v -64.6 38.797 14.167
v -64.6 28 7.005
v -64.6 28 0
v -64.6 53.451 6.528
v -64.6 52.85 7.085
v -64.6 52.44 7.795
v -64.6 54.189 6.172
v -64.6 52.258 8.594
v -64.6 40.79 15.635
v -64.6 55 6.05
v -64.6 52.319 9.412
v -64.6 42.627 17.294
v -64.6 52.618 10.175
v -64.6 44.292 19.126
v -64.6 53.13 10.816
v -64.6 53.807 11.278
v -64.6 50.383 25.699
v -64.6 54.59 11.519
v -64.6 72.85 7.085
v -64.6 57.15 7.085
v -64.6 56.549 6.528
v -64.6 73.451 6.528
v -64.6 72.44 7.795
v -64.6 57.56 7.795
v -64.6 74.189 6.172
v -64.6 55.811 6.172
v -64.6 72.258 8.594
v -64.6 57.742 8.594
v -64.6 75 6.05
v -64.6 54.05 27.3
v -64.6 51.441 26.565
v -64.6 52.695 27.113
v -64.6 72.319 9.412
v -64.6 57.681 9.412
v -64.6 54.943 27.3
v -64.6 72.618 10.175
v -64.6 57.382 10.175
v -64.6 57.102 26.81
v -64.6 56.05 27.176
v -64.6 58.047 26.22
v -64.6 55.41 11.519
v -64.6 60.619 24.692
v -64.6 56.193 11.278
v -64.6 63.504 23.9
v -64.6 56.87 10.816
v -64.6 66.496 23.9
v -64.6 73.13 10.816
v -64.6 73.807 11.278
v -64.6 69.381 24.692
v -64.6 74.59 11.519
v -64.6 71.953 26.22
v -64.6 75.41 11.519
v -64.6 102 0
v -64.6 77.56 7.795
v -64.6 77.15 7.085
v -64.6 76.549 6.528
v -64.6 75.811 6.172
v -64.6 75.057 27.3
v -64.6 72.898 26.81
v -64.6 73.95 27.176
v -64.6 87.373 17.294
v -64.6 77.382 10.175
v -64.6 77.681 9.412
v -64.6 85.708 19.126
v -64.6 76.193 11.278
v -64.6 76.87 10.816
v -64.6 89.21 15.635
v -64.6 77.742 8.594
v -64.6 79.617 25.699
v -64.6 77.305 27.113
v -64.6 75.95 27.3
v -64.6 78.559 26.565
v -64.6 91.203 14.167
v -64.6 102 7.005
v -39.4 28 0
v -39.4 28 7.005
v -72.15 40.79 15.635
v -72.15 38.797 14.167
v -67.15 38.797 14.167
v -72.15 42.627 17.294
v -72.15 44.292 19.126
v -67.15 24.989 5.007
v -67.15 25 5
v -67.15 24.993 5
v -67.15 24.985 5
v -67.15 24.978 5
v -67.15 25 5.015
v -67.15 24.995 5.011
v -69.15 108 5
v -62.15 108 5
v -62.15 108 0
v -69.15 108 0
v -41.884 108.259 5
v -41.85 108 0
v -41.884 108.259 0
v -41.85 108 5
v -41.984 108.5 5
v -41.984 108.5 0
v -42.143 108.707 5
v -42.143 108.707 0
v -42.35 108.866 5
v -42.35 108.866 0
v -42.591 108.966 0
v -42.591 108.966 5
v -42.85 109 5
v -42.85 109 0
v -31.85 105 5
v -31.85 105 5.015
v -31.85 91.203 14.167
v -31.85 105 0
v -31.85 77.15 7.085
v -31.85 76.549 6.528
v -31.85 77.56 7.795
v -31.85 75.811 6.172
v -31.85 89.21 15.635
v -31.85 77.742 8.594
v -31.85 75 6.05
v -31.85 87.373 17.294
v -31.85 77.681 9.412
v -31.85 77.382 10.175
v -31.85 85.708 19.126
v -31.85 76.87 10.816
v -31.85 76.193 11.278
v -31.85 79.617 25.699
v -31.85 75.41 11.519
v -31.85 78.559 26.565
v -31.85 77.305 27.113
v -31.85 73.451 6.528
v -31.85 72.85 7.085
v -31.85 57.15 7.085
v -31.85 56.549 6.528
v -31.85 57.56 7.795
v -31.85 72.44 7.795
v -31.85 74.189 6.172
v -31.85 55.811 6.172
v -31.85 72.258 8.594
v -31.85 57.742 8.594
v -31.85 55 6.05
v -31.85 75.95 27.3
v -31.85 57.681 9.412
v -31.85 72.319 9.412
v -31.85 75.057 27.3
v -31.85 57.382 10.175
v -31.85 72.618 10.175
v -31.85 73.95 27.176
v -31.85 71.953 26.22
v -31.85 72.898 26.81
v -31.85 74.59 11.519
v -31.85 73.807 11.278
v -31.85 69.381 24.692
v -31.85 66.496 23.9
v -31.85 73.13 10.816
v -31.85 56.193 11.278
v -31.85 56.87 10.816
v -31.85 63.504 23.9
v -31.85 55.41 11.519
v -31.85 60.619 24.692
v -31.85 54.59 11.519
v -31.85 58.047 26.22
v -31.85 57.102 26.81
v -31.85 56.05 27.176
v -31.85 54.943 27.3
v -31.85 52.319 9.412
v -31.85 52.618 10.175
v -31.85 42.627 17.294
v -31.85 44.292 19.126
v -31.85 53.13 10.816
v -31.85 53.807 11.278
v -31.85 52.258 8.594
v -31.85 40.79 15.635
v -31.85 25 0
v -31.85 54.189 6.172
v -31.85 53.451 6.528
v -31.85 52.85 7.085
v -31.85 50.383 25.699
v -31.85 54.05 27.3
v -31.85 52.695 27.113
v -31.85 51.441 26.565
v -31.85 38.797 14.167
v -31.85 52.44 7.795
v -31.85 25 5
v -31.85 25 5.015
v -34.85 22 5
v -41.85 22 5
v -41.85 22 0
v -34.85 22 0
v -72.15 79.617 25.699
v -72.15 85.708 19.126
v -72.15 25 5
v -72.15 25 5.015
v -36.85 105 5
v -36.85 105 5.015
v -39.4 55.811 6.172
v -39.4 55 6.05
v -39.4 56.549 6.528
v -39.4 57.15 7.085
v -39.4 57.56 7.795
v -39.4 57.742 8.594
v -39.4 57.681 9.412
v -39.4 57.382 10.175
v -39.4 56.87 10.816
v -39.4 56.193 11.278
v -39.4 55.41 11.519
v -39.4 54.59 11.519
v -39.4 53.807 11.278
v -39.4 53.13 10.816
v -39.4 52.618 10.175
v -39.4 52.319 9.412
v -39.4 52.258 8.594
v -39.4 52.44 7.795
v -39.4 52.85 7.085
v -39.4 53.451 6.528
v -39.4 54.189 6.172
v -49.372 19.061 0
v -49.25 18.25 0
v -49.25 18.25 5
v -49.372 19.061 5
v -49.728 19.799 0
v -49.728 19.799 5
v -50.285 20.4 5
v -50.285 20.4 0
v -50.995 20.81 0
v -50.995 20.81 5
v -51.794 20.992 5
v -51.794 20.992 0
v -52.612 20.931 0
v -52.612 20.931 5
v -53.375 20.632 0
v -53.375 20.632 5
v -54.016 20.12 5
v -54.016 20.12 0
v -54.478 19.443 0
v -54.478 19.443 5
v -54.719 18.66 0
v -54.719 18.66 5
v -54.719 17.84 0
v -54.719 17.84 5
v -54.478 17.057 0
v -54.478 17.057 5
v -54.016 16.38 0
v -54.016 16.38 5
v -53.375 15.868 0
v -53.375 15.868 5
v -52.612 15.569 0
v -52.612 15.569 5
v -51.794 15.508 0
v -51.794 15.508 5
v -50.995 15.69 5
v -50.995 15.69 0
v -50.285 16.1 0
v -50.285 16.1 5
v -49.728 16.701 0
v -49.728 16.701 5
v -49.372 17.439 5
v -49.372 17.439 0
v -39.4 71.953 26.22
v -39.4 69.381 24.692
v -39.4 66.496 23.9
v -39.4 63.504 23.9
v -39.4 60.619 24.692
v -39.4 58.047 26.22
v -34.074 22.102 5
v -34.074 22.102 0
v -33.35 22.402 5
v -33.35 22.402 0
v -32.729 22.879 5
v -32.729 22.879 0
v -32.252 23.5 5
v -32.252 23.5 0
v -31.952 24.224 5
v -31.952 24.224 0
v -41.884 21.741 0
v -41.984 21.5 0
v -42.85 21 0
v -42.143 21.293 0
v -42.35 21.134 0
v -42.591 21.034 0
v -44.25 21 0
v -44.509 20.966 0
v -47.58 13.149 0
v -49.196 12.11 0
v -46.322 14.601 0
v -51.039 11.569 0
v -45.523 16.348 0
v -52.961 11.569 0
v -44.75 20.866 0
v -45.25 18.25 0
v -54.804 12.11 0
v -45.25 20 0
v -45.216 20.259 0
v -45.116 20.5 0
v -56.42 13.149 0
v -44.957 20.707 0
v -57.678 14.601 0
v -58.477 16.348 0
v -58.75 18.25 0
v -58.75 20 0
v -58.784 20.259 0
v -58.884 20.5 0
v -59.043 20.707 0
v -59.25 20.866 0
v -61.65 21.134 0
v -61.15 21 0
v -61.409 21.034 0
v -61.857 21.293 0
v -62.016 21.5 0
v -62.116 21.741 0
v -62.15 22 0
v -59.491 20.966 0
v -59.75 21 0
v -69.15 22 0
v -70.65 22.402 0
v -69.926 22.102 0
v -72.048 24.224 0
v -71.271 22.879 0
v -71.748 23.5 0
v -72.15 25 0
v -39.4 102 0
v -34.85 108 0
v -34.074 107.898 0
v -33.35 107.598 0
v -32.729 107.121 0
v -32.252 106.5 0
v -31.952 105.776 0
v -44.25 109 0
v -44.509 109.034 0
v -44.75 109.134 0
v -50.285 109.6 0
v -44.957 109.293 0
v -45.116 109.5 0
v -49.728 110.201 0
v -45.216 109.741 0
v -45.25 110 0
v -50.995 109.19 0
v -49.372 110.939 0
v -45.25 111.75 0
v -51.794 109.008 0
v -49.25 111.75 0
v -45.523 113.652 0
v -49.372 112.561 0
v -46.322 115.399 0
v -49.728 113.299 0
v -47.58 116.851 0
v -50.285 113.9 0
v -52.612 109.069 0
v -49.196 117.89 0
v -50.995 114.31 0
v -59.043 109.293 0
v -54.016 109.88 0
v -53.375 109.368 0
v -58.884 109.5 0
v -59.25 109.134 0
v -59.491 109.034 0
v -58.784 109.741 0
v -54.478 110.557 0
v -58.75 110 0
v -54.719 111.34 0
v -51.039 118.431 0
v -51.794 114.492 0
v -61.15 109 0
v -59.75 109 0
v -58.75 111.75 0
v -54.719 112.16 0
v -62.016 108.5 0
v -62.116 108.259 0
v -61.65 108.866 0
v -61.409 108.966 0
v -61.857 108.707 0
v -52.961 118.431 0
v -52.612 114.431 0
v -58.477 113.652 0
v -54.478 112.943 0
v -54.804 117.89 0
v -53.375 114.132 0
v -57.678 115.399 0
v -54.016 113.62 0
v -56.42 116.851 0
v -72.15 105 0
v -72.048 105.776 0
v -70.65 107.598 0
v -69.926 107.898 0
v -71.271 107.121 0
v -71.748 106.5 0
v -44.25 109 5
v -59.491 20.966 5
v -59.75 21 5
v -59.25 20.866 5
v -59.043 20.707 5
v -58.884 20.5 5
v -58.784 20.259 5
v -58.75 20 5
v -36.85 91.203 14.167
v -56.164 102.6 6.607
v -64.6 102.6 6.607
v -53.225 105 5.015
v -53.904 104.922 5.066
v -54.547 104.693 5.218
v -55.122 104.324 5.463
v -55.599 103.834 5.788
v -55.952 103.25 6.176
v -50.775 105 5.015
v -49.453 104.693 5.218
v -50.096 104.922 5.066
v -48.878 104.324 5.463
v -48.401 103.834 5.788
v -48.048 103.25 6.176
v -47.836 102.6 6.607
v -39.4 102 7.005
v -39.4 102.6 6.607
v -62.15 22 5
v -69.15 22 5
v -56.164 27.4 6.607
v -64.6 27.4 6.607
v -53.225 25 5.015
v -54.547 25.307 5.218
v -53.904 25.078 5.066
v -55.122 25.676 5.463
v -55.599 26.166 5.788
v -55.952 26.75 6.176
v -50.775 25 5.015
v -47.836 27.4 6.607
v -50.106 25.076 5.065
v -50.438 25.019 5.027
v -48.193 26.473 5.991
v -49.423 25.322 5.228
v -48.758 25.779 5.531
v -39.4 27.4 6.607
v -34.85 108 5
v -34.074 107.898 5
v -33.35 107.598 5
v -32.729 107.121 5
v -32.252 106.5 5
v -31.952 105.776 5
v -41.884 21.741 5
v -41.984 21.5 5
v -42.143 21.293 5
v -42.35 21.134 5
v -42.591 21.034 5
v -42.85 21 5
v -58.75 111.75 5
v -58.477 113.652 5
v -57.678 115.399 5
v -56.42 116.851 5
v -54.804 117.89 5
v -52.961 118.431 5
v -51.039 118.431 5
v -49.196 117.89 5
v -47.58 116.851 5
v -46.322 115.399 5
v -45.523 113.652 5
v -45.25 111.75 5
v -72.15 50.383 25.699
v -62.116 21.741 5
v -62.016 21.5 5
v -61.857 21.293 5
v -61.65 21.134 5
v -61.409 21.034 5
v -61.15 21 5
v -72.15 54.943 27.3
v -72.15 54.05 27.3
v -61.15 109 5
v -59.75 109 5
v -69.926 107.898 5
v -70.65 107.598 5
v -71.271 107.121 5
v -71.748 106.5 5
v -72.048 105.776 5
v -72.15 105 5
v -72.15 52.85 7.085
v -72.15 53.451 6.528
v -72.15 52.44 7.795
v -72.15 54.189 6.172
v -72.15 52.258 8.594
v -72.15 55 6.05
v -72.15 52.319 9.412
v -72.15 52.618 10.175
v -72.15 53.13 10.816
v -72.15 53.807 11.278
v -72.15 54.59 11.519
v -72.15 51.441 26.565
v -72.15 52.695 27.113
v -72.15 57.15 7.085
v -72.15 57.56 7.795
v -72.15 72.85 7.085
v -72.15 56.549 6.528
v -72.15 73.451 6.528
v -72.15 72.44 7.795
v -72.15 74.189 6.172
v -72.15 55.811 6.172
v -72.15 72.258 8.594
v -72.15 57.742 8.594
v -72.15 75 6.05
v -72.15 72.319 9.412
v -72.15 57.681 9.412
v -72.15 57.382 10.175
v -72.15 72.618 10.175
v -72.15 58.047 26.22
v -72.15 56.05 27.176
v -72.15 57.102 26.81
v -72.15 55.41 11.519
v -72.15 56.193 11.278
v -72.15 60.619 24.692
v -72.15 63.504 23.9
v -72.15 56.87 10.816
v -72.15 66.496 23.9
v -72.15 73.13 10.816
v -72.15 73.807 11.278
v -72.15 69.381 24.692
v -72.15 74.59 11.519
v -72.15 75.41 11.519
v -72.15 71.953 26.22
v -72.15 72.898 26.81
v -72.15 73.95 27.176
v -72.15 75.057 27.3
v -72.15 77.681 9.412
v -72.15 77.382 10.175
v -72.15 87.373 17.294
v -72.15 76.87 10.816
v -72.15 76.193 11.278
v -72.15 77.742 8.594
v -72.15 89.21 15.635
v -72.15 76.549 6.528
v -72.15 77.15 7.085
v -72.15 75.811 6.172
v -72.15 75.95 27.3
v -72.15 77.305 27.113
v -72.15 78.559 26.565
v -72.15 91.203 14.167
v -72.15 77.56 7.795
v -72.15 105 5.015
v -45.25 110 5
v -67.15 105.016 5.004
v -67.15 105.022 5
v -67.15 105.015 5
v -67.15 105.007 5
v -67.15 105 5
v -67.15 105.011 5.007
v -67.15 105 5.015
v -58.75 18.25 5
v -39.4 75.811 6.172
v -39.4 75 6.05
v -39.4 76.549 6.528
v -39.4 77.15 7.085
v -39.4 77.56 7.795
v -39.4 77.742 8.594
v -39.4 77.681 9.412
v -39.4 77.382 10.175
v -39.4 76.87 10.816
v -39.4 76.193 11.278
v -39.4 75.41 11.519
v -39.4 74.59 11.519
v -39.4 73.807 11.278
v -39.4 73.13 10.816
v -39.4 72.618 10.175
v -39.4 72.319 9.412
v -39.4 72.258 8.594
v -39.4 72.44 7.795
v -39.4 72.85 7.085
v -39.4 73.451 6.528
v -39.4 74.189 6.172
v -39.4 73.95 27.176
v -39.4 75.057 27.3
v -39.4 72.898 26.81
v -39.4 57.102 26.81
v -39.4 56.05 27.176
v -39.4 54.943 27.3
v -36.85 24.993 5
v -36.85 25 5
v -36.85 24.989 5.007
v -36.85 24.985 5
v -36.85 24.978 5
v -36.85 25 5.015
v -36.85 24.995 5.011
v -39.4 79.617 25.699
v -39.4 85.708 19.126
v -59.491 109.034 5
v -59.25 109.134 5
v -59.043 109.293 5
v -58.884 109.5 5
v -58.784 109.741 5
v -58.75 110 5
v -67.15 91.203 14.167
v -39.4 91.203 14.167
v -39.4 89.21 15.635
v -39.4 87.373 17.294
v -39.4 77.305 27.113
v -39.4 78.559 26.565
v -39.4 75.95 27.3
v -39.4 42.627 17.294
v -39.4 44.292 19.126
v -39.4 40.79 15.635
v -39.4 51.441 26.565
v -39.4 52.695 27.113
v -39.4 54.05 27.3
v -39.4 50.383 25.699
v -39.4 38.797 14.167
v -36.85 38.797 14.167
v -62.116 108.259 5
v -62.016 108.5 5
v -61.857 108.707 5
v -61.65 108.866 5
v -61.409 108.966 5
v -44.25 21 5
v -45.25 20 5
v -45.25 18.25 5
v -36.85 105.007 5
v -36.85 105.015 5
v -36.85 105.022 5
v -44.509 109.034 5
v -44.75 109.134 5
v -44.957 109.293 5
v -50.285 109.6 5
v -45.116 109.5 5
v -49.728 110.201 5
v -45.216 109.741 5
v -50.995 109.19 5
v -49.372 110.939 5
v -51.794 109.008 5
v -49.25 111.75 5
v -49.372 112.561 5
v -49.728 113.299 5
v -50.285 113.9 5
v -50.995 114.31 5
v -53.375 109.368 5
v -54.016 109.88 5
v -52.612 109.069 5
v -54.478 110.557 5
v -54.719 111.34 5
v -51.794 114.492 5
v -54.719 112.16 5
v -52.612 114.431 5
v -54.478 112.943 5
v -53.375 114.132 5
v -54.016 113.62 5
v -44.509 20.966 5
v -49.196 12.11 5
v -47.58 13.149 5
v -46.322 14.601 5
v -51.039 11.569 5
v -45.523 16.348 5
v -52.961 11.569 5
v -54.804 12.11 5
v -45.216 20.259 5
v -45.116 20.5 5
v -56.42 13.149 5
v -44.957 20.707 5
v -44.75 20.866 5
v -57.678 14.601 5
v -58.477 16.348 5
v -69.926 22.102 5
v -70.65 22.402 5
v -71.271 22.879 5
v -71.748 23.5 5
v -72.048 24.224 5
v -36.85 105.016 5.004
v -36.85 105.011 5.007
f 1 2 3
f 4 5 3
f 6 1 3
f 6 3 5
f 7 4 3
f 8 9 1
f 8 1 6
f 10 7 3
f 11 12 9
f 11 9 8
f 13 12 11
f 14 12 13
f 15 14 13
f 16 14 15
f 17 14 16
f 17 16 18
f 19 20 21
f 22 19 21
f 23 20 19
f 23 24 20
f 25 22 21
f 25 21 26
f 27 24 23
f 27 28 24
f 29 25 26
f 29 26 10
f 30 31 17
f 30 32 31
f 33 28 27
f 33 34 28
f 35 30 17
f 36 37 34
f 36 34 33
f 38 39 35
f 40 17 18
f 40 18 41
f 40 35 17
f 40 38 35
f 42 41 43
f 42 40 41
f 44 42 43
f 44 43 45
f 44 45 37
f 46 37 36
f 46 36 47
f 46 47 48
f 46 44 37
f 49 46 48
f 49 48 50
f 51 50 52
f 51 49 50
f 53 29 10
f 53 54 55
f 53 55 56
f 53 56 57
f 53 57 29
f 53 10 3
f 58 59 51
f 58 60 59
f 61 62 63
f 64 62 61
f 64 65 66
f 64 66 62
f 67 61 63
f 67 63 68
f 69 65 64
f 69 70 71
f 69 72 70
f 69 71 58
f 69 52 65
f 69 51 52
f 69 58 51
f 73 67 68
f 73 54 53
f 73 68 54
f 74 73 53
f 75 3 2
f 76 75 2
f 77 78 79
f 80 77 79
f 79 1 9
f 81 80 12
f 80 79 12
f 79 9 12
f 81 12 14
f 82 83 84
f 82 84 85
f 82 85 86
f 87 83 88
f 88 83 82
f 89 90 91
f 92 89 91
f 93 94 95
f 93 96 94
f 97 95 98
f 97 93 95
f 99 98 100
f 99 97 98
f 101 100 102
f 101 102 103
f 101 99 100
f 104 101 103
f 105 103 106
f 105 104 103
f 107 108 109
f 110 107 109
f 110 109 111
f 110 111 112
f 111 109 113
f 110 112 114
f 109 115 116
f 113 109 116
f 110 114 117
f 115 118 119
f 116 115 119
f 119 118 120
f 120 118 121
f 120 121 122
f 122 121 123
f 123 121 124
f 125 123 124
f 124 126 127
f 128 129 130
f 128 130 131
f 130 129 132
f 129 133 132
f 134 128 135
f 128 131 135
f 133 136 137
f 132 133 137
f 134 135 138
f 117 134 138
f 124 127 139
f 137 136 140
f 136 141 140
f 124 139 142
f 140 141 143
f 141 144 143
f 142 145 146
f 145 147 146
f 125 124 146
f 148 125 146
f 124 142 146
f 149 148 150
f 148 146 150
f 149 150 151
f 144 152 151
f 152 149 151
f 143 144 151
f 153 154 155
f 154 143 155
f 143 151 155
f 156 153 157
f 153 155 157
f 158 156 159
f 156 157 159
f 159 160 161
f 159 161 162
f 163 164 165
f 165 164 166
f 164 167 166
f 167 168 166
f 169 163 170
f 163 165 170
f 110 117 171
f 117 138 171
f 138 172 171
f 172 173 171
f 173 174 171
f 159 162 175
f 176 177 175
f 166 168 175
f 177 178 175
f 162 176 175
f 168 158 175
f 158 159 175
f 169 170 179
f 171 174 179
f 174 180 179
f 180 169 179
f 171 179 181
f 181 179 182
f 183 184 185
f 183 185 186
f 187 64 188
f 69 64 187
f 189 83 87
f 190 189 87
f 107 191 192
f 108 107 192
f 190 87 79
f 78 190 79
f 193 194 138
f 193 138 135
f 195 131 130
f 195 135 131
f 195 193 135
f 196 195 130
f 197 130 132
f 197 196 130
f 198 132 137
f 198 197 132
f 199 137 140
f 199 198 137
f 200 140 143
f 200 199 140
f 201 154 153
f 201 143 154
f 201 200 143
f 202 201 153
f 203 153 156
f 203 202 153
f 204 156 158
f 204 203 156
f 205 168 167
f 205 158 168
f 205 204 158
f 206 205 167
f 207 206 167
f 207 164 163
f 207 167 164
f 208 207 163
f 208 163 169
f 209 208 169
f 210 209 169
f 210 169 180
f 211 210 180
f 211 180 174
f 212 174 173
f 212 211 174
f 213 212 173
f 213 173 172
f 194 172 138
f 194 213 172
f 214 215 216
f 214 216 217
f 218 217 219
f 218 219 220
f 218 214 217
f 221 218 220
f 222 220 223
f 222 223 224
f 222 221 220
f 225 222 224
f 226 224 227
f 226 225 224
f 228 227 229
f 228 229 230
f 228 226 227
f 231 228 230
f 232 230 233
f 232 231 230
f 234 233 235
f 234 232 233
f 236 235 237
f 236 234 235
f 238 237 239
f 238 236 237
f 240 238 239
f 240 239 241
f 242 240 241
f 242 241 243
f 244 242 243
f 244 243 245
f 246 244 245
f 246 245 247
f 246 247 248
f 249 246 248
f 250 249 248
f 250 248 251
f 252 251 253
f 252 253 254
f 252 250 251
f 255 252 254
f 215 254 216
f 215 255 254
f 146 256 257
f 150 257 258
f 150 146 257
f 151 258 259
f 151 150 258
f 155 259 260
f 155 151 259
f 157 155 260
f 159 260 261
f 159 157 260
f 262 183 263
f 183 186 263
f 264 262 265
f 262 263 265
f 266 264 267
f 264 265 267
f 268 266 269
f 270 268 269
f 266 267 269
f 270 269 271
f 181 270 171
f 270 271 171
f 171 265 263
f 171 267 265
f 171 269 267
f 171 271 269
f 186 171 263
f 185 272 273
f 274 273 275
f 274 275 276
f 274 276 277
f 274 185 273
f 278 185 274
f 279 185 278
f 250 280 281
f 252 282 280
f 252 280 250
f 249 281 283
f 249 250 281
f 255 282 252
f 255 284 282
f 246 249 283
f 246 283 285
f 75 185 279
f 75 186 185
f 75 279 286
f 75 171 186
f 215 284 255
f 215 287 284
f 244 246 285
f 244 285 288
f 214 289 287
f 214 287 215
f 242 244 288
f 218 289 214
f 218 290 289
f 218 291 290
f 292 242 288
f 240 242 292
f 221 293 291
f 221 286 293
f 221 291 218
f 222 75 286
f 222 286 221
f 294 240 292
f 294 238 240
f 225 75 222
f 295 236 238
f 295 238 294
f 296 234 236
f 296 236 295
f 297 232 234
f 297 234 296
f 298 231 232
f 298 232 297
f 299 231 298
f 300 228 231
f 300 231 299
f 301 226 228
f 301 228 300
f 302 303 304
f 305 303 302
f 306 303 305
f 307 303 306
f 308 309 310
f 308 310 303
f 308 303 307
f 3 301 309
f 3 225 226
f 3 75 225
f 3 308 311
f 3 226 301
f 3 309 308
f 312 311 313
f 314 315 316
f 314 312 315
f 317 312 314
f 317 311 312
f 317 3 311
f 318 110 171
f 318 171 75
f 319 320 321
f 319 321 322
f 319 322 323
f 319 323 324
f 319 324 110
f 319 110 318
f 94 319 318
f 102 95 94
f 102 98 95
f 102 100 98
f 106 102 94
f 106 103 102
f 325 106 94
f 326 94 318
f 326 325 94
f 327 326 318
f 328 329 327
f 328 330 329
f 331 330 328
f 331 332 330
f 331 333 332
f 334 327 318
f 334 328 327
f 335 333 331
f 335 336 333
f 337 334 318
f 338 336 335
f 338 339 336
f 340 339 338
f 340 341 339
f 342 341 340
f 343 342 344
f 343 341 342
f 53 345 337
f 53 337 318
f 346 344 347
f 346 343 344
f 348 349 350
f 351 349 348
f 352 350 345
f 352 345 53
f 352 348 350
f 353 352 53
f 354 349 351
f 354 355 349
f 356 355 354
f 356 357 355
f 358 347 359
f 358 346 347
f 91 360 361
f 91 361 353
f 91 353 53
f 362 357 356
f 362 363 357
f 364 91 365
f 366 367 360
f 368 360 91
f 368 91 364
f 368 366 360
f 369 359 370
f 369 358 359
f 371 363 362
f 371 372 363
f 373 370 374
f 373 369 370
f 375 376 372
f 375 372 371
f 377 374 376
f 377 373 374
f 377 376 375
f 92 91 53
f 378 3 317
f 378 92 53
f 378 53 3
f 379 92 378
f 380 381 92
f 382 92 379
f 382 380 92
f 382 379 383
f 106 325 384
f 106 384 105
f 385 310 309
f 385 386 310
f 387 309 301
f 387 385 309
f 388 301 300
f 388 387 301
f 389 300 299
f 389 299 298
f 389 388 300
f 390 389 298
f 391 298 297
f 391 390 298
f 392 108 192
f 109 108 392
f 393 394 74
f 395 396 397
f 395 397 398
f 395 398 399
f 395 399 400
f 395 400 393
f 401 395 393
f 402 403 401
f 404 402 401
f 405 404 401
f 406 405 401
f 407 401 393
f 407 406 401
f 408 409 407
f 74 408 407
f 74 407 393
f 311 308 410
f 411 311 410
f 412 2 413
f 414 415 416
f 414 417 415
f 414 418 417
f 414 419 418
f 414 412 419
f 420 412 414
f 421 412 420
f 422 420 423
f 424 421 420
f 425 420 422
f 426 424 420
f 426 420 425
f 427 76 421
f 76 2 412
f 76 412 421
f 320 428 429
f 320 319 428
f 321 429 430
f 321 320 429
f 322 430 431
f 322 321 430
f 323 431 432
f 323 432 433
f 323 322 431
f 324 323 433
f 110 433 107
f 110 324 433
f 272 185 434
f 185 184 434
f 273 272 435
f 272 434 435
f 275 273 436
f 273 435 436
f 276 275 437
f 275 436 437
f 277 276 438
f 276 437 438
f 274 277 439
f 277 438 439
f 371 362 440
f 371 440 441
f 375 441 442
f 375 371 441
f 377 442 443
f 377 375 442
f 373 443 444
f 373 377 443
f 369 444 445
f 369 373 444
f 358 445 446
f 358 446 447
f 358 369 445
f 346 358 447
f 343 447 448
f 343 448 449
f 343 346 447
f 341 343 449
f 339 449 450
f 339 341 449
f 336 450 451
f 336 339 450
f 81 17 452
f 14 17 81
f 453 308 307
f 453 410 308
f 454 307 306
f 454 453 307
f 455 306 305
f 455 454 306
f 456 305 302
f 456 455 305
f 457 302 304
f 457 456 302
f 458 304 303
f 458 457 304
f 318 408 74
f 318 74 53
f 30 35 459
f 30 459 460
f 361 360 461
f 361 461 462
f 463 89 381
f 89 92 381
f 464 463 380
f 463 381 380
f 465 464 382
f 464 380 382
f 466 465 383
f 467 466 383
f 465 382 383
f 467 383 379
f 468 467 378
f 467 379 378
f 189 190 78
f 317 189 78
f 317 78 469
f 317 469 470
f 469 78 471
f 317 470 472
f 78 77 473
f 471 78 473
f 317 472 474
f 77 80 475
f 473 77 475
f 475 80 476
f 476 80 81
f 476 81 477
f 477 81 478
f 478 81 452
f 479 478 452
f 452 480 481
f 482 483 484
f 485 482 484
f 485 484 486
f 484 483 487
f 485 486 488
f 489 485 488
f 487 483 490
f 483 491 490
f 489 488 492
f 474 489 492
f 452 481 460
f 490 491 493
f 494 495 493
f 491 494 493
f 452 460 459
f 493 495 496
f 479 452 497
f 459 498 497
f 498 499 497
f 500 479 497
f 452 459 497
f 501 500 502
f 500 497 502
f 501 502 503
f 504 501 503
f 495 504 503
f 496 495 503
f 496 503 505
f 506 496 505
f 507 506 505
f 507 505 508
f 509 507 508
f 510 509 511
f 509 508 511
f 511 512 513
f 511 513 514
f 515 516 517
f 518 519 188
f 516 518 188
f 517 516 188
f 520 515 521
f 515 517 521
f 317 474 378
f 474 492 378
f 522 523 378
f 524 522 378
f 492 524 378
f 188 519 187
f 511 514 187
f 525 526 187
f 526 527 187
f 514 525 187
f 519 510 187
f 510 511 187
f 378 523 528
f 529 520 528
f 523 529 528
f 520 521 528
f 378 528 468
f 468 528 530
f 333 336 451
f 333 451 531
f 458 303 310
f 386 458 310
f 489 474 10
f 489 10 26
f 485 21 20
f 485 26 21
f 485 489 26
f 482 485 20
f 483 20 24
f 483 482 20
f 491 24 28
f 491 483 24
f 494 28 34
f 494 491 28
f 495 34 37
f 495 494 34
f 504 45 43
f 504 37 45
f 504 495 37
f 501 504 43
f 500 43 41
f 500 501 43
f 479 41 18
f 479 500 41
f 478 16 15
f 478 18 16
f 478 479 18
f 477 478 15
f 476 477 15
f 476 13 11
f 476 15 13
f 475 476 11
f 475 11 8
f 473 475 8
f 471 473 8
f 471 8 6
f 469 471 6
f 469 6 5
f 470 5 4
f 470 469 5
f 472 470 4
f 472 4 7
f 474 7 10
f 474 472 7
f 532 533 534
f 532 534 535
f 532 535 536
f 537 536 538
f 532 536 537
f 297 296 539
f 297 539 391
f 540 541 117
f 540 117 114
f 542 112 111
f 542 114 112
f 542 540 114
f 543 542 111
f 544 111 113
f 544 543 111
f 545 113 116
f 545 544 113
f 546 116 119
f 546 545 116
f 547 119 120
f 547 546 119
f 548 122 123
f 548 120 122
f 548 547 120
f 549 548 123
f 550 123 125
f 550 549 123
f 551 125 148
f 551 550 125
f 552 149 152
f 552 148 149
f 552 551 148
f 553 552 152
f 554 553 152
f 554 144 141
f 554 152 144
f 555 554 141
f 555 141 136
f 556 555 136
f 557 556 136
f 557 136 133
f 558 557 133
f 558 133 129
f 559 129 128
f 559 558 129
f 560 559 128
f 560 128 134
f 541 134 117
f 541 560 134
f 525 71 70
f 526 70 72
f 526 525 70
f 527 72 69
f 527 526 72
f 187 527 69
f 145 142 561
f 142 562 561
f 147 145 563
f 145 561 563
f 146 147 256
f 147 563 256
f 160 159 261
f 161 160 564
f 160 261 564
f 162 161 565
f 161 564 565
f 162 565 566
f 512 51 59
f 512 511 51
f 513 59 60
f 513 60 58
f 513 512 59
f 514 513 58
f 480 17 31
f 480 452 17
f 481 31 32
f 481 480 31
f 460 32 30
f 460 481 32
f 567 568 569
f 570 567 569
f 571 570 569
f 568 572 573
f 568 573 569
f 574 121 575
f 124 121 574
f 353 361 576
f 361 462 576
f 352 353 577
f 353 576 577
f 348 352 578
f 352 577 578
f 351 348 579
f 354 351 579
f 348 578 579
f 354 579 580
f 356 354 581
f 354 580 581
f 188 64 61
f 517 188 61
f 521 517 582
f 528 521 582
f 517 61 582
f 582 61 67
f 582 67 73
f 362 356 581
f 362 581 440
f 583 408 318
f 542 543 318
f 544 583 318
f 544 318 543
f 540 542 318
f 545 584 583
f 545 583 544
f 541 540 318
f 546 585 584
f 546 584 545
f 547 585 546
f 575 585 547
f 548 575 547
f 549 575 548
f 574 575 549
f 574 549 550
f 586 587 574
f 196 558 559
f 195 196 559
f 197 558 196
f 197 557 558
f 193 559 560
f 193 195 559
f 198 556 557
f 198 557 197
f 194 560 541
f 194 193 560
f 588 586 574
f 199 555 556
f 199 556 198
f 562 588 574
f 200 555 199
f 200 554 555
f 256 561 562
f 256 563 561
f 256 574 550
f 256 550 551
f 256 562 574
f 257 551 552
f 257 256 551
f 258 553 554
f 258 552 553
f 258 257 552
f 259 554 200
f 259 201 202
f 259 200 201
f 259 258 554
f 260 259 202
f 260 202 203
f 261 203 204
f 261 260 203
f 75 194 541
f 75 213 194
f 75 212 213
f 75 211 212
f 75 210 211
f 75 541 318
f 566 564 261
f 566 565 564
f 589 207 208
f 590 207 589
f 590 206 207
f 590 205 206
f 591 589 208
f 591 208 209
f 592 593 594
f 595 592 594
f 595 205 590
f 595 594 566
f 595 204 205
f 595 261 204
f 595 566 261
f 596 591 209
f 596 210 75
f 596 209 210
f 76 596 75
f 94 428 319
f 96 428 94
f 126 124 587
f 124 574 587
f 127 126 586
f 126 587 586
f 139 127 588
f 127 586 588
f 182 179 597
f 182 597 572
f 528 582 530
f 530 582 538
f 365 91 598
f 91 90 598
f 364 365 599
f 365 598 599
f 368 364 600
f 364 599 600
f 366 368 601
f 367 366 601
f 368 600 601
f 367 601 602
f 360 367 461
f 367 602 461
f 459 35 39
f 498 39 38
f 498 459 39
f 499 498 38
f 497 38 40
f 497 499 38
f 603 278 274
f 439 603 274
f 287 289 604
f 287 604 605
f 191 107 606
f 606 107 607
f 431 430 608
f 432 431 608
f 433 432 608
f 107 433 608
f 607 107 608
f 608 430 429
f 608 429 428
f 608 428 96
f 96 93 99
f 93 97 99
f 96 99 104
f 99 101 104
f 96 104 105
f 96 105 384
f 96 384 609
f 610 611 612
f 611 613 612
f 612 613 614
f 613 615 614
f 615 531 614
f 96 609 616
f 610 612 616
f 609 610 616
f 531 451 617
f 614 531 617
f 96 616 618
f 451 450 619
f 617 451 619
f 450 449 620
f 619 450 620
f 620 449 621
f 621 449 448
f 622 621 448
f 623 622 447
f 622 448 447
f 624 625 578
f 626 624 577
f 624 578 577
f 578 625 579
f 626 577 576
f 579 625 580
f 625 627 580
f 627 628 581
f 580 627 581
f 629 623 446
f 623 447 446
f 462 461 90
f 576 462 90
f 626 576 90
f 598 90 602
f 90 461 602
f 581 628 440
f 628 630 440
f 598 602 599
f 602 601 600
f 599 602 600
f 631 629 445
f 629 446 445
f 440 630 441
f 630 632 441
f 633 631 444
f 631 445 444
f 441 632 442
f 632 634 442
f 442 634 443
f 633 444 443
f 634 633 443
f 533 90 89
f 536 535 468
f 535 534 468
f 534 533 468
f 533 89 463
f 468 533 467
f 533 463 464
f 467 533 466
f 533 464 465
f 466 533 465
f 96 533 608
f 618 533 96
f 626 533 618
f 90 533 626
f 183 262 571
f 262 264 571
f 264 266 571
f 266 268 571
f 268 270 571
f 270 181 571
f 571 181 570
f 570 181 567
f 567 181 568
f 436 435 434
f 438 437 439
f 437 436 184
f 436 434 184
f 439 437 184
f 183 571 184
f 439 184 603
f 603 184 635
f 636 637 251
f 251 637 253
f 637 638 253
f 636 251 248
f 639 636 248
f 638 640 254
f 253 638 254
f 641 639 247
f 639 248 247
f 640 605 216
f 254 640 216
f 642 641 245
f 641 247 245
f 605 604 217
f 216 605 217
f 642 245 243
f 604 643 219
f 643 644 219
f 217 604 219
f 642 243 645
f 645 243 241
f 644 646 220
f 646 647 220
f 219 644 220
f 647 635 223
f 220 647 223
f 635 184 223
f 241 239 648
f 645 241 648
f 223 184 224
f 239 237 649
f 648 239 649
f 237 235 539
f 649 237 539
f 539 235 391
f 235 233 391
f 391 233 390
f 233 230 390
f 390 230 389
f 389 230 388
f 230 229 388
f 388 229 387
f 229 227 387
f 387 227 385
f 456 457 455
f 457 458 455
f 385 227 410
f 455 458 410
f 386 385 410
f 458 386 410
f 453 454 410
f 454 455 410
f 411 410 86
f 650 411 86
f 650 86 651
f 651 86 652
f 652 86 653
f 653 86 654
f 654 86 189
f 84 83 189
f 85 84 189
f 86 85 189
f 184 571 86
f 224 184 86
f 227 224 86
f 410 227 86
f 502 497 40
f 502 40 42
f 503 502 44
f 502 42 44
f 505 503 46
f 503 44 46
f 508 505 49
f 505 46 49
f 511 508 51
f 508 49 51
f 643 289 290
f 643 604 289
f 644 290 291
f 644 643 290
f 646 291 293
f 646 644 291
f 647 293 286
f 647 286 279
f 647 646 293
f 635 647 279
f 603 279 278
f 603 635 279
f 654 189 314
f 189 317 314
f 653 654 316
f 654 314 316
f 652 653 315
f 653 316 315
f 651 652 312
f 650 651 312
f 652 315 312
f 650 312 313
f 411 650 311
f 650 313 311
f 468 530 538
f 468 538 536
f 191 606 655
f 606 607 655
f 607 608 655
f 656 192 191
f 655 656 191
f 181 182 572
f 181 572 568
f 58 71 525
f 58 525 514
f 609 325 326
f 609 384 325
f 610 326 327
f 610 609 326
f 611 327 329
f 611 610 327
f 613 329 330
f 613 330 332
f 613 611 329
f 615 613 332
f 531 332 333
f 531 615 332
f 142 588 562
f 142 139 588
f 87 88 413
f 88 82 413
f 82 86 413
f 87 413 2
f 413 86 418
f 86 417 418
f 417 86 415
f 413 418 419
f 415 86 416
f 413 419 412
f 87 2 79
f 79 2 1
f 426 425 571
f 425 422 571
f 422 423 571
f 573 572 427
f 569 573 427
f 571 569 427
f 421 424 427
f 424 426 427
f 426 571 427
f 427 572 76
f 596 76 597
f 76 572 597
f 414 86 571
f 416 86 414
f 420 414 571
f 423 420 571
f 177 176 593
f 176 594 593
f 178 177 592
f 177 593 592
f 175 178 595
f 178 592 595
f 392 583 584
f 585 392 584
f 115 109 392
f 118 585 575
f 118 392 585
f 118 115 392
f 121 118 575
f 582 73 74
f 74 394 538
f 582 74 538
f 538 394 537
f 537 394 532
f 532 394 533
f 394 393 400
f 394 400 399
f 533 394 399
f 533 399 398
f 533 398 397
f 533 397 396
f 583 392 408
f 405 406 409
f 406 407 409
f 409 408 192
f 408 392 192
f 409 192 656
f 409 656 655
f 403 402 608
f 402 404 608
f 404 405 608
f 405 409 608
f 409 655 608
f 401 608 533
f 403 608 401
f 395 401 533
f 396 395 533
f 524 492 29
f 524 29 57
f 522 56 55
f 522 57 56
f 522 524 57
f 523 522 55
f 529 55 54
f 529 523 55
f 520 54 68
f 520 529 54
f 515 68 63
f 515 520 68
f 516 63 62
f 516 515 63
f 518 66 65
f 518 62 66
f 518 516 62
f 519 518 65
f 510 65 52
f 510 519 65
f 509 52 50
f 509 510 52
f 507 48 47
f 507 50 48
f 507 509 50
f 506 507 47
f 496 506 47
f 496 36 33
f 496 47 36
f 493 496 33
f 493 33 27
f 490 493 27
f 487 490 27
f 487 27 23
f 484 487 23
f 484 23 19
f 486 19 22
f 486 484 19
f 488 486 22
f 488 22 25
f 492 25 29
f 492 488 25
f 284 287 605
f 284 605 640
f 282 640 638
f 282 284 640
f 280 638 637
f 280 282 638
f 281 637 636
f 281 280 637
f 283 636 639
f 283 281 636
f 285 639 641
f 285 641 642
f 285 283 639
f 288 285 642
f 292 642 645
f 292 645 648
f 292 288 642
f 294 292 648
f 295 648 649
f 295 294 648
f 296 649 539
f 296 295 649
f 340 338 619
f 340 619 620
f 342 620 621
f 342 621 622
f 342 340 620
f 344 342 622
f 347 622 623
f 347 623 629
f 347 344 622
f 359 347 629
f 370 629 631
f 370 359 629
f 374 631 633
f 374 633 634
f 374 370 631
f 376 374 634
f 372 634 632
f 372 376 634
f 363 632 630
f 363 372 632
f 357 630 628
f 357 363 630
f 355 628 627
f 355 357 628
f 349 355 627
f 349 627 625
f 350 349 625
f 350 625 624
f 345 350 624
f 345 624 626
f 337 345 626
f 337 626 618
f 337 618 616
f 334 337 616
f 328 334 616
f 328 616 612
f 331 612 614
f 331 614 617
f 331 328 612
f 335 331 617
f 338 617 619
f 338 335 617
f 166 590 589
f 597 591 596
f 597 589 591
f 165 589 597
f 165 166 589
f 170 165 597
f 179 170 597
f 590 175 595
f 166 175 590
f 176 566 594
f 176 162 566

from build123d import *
from build123d.topology import SkipClean

# Parameters (mm, degrees)
SKETCH2_R               = 2.75
SKETCH2_W               = 8.45
SKETCH2_H               = 80
BOSS_EXTRUDE1_DEPTH     = 5
SKETCH4_W               = 3.4
SKETCH4_H               = 88
BOSS_EXTRUDE2_DEPTH     = 5
BOSS_EXTRUDE3_DEPTH     = 20.3
FILLET3_R               = 4.2
SKETCH7_W               = 8.45
SKETCH7_H               = 80
CUT_EXTRUDE1_DEPTH      = 38
FILLET4_R               = 3
FILLET5_R               = 1
BOSS_EXTRUDE4_START     = 5
BOSS_EXTRUDE4_DEPTH     = 5
BOSS_EXTRUDE5_DEPTH     = 5
CUT_EXTRUDE2_START      = -5
CUT_EXTRUDE2_DEPTH      = 5
CUT_EXTRUDE3_DEPTH      = 5
FILLET6_R               = 3
CUT_EXTRUDE4_DEPTH      = 140.468166751
CUT_EXTRUDE4_DEPTH_BACK = 140.468166751
BOSS_EXTRUDE6_START     = 3
BOSS_EXTRUDE6_DEPTH     = 3
BOSS_EXTRUDE7_DEPTH     = 3
BOSS_EXTRUDE8_DEPTH     = 2
BOSS_EXTRUDE9_START     = 2
BOSS_EXTRUDE9_DEPTH     = 2
BOSS_EXTRUDE10_DEPTH    = 5
FILLET8_R               = 3
CUT_EXTRUDE5_DEPTH      = 129.710283337
CUT_EXTRUDE5_DEPTH_BACK = 129.710283337
SKETCH21_R              = 2.75
BOSS_EXTRUDE11_DEPTH    = 40.3
CUT_EXTRUDE6_DEPTH      = 129.710283337
CUT_EXTRUDE6_DEPTH_BACK = 129.710283337
CUT_EXTRUDE7_DEPTH      = 129.107884223
CUT_EXTRUDE7_DEPTH_BACK = 129.107884223
FILLET9_R               = 5


with BuildPart() as part:
    # Sketch2 → Boss-Extrude1 (new body)
    with BuildSketch(Plane.XY):
        with BuildLine():
            Line((-58.75, 18.25), (-58.75, 111.75))
            ThreePointArc((-58.75, 111.75), (-52, 118.5), (-45.25, 111.75))
            Line((-45.25, 111.75), (-45.25, 18.25))
            ThreePointArc((-45.25, 18.25), (-52, 11.5), (-58.75, 18.25))
        make_face()
        with Locations((-52, 18.25)):
            Circle(SKETCH2_R, mode=Mode.SUBTRACT)
        with Locations((-52, 111.75)):
            Circle(SKETCH2_R, mode=Mode.SUBTRACT)
        with Locations((-52, 65)):
            Rectangle(SKETCH2_W, SKETCH2_H, mode=Mode.SUBTRACT)
    extrude(amount=BOSS_EXTRUDE1_DEPTH)

    # Sketch4 → Boss-Extrude2 (add)
    with BuildSketch(Plane.XY):
        with Locations((-60.45, 65)):
            Rectangle(SKETCH4_W, SKETCH4_H)
        with Locations((-43.55, 65)):
            Rectangle(SKETCH4_W, SKETCH4_H)
    extrude(amount=BOSS_EXTRUDE2_DEPTH)

    # Sketch5 → Boss-Extrude3 (add)
    with BuildSketch(Plane(origin=(-41.85, 0, 0), x_dir=(0, 0, -1), z_dir=(1, 0, 0))):
        with BuildLine():
            Line((-14.166666667, 38.797294107), (-5, 24.978024147))
            Line((-5, 24.978024147), (-5, 105.021975853))
            Line((-5, 105.021975853), (-14.166666667, 91.202705893))
            ThreePointArc((-14.166666667, 91.202705893), (-21.023858428, 84.293554139), (-30, 80.527078425))
            Line((-30, 80.527078425), (-30, 75.021975853))
            ThreePointArc((-30, 75.021975853), (-23.8, 65), (-30, 54.978024147))
            Line((-30, 54.978024147), (-30, 49.472921575))
            ThreePointArc((-30, 49.472921575), (-21.023858428, 45.706445861), (-14.166666667, 38.797294107))
        make_face()
    extrude(amount=-BOSS_EXTRUDE3_DEPTH)

    # Fillet3
    # the kernel refuses this fillet: 4.2 mm, written as the material it takes off along each edge
    with BuildSketch(Plane(origin=(-33.805211267, 80.527078425, 30), x_dir=(0, 0.2579921020094514, -0.9661470257164511), z_dir=(-1, 0, 0))) as fillet3_piece_1:
        with BuildLine():
            CenterArc((3.227620726, 4.192546311), FILLET3_R, 194.950953872, 71.635051289)
            Line((-0.830196782, 3.108979483), (0, 0))
            ThreePointArc((0, 0), (1.488754947, 0.044367195), (2.977509895, 0))
        make_face()
    extrude(amount=36.389577466, mode=Mode.SUBTRACT)
    with BuildSketch(Plane(origin=(-36.03019267, 54.978024147, 30), x_dir=(0, 0.5239775265852198, -0.8517320891181893), z_dir=(-1, 0, 0))) as fillet3_piece_2:
        with BuildLine():
            CenterArc((2.357495474, 4.183472274), FILLET3_R, 211.599436319, 53.315901995)
            Line((-1.2197793, 1.982766662), (0, 0))
            ThreePointArc((0, 0), (0.992629673, 0.044073937), (1.985259347, 0))
        make_face()
    extrude(amount=31.93961466, mode=Mode.SUBTRACT)
    with BuildSketch(Plane(origin=(-36.03019267, 75.021975853, 30), x_dir=(0, 1, 0), z_dir=(-1, 0, 0))) as fillet3_piece_3:
        with BuildLine():
            CenterArc((2.327922932, 4.2), FILLET3_R, 216.684098005, 53.315901995)
            ThreePointArc((-1.040231282, 1.690909091), (-0.482576455, 0.868548298), (0, 0))
            Line((0, 0), (2.327922932, 0))
        make_face()
    extrude(amount=31.93961466, mode=Mode.SUBTRACT)
    with BuildSketch(Plane(origin=(-33.805211267, 49.472921575, 30), x_dir=(0, -0.25799210200945616, -0.96614702571645), z_dir=(-1, 0, 0))) as fillet3_piece_4:
        with BuildLine():
            CenterArc((3.227620726, -4.192546311), FILLET3_R, 93.413994839, 71.635051289)
            Line((-0.830196782, -3.108979483), (0, 0))
            ThreePointArc((0, 0), (1.488754947, -0.044367195), (2.977509895, 0))
        make_face()
    extrude(amount=36.389577466, mode=Mode.SUBTRACT)

    # Sketch7 → Cut-Extrude1 (cut)
    with BuildSketch(Plane(origin=(0, 0, 5), x_dir=(-1, 0, 0), z_dir=(0, 0, -1))):
        with Locations((52, 65)):
            Rectangle(SKETCH7_W, SKETCH7_H)
    extrude(amount=-CUT_EXTRUDE1_DEPTH, mode=Mode.SUBTRACT)

    # Fillet4
    fillet4_edges = [part.edges().sort_by_distance(p)[0] for p in [
        (-56.225, 105, 2.507288566),
        (-56.225, 25, 2.507288566),
        (-47.775, 25, 2.507288566),
        (-47.775, 105, 2.507288566),
    ]]
    fillet(fillet4_edges, radius=FILLET4_R)

    # Fillet5
    fillet5_edges = [part.edges().sort_by_distance(p)[0] for p in [
        (-62.15, 21, 2.5),
        (-58.75, 21, 2.5),
        (-41.85, 109, 2.5),
        (-45.25, 109, 2.5),
        (-62.15, 109, 2.5),
        (-45.25, 21, 2.5),
        (-41.85, 21, 2.5),
        (-58.75, 109, 2.5),
    ]]
    fillet(fillet5_edges, radius=FILLET5_R)

    # Sketch8 → Boss-Extrude4 (add)
    with SkipClean():  # the faces are left unmerged after this step: merging them gives an invalid solid
        with BuildSketch(Plane(origin=(-41.85, 0, 0), x_dir=(0, 0, -1), z_dir=(1, 0, 0)).offset(BOSS_EXTRUDE4_START)):
            with BuildLine():
                Line((0, 22), (0, 108))
                Line((0, 108), (-5, 108))
                Line((-5, 108), (-5, 105.021975853))
                Line((-5, 105.021975853), (-14.166666667, 91.202705893))
                ThreePointArc((-14.166666667, 91.202705893), (-19.814280101, 85.162622612), (-27.123287671, 81.295252462))
                ThreePointArc((-27.123287671, 81.295252462), (-29.199746644, 79.775277843), (-29.999950613, 77.329530859))
                ThreePointArc((-29.999950613, 77.329530859), (-29.548963562, 75.45641728), (-28.309090909, 73.981744571))
                ThreePointArc((-28.309090909, 73.981744571), (-23.8, 65), (-28.309090909, 56.018255429))
                ThreePointArc((-28.309090909, 56.018255429), (-29.548963562, 54.54358272), (-29.999950613, 52.670469141))
                ThreePointArc((-29.999950613, 52.670469141), (-29.199746644, 50.224722157), (-27.123287671, 48.704747538))
                ThreePointArc((-27.123287671, 48.704747538), (-19.814280101, 44.837377388), (-14.166666667, 38.797294107))
                Line((-14.166666667, 38.797294107), (-5, 24.978024147))
                Line((-5, 24.978024147), (-5, 22))
                Line((-5, 22), (0, 22))
            make_face()
        extrude(amount=-BOSS_EXTRUDE4_DEPTH)

    # Sketch9 → Boss-Extrude5 (add)
    with SkipClean():  # the faces are left unmerged after this step: merging them gives an invalid solid
        with BuildSketch(Plane.ZY.offset(62.15)):
            with BuildLine():
                Line((5, 105.021975853), (5, 108))
                Line((5, 108), (0, 108))
                Line((0, 108), (0, 22))
                Line((0, 22), (5, 22))
                Line((5, 22), (5, 24.978024147))
                Line((5, 24.978024147), (14.166666667, 38.797294107))
                ThreePointArc((14.166666667, 38.797294107), (19.814280101, 44.837377388), (27.123287671, 48.704747538))
                ThreePointArc((27.123287671, 48.704747538), (29.199746644, 50.224722157), (29.999950613, 52.670469141))
                ThreePointArc((29.999950613, 52.670469141), (29.548963562, 54.54358272), (28.309090909, 56.018255429))
                ThreePointArc((28.309090909, 56.018255429), (23.8, 65), (28.309090909, 73.981744571))
                ThreePointArc((28.309090909, 73.981744571), (29.548963562, 75.45641728), (29.999950613, 77.329530859))
                ThreePointArc((29.999950613, 77.329530859), (29.199746644, 79.775277843), (27.123287671, 81.295252462))
                ThreePointArc((27.123287671, 81.295252462), (19.814280101, 85.162622612), (14.166666667, 91.202705893))
                Line((14.166666667, 91.202705893), (5, 105.021975853))
            make_face()
        extrude(amount=BOSS_EXTRUDE5_DEPTH)

    # Sketch10 → Cut-Extrude2 (cut)
    with SkipClean():  # the faces are left unmerged after this step: merging them gives an invalid solid
        with BuildSketch(Plane.ZY.offset(47.775).offset(CUT_EXTRUDE2_START)):
            with BuildLine():
                Line((14.166666667, 91.202705893), (7.004552006, 102))
                Line((7.004552006, 102), (0, 102))
                Line((0, 102), (0, 28))
                Line((0, 28), (7.004552006, 28))
                Line((7.004552006, 28), (14.166666667, 38.797294107))
                ThreePointArc((14.166666667, 38.797294107), (19.814280101, 44.837377388), (27.123287671, 48.704747538))
                ThreePointArc((27.123287671, 48.704747538), (29.199746644, 50.224722157), (29.999950613, 52.670469141))
                ThreePointArc((29.999950613, 52.670469141), (29.548963562, 54.54358272), (28.309090909, 56.018255429))
                ThreePointArc((28.309090909, 56.018255429), (23.8, 65), (28.309090909, 73.981744571))
                ThreePointArc((28.309090909, 73.981744571), (29.548963562, 75.45641728), (29.999950613, 77.329530859))
                ThreePointArc((29.999950613, 77.329530859), (29.199746644, 79.775277843), (27.123287671, 81.295252462))
                ThreePointArc((27.123287671, 81.295252462), (19.814280101, 85.162622612), (14.166666667, 91.202705893))
            make_face()
        extrude(amount=CUT_EXTRUDE2_DEPTH, mode=Mode.SUBTRACT)

    # Sketch11 → Cut-Extrude3 (cut)
    with SkipClean():  # the faces are left unmerged after this step: merging them gives an invalid solid
        with BuildSketch(Plane(origin=(-56.225, 0, 0), x_dir=(0, 0, -1), z_dir=(1, 0, 0))):
            with BuildLine():
                Line((0, 28), (0, 102))
                Line((0, 102), (-7.004552006, 102))
                Line((-7.004552006, 102), (-14.166666667, 91.202705893))
                ThreePointArc((-14.166666667, 91.202705893), (-19.814280101, 85.162622612), (-27.123287671, 81.295252462))
                ThreePointArc((-27.123287671, 81.295252462), (-29.199746644, 79.775277843), (-29.999950613, 77.329530859))
                ThreePointArc((-29.999950613, 77.329530859), (-29.548963562, 75.45641728), (-28.309090909, 73.981744571))
                ThreePointArc((-28.309090909, 73.981744571), (-23.8, 65), (-28.309090909, 56.018255429))
                ThreePointArc((-28.309090909, 56.018255429), (-29.548963562, 54.54358272), (-29.999950613, 52.670469141))
                ThreePointArc((-29.999950613, 52.670469141), (-29.199746644, 50.224722157), (-27.123287671, 48.704747538))
                ThreePointArc((-27.123287671, 48.704747538), (-19.814280101, 44.837377388), (-14.166666667, 38.797294107))
                Line((-14.166666667, 38.797294107), (-7.004552006, 28))
                Line((-7.004552006, 28), (0, 28))
            make_face()
        extrude(amount=-CUT_EXTRUDE3_DEPTH, mode=Mode.SUBTRACT)

    # Fillet6
    fillet6_edges = [part.edges().sort_by_distance(p)[0] for p in [
        (-67.15, 22, 2.5),
        (-36.85, 22, 2.5),
        (-36.85, 108, 2.5),
        (-67.15, 108, 2.5),
    ]]
    fillet(fillet6_edges, radius=FILLET6_R)

    # Sketch12 → Cut-Extrude4 (cut, two sides: drawn at the far end of the back side and taken through both)
    with BuildSketch(Plane(origin=(0, 0, 0), x_dir=(-1, 0, 0), z_dir=(0, 0, -1)).offset(-CUT_EXTRUDE4_DEPTH_BACK)):
        Polygon((42.775, 102), (42.775, 28), (47.775, 28), (56.225, 28), (61.225, 28), (61.225, 102), (56.225, 102), (47.775, 102), align=None)
        Polygon((61.225, 102), (61.225, 28), (64, 28), (64, 75), (64, 102), align=None)
        with BuildLine():
            Line((61.225, 28), (56.225, 28))
            ThreePointArc((56.225, 28), (56.209808459, 27.698473114), (56.164387691, 27.4))
            Line((56.164387691, 27.4), (61.225, 27.4))
            Line((61.225, 27.4), (64.6, 27.4))
            Line((64.6, 27.4), (64.6, 102))
            Line((64.6, 102), (64.6, 102.6))
            Line((64.6, 102.6), (64, 102.6))
            Line((64, 102.6), (56.164387691, 102.6))
            ThreePointArc((56.164387691, 102.6), (56.209808459, 102.301526886), (56.225, 102))
            Line((56.225, 102), (61.225, 102))
            Line((61.225, 102), (64, 102))
            Line((64, 102), (64, 75))
            Line((64, 75), (64, 28))
            Line((64, 28), (61.225, 28))
        make_face()
        with BuildLine():
            Line((56.225, 28), (47.775, 28))
            ThreePointArc((47.775, 28), (47.790191541, 27.698473114), (47.835612309, 27.4))
            Line((47.835612309, 27.4), (56.164387691, 27.4))
            ThreePointArc((56.164387691, 27.4), (56.209808459, 27.698473114), (56.225, 28))
        make_face()
        Polygon((40, 55), (40, 100.870302184), (40, 102), (42.775, 102), (42.775, 28), (40, 28), align=None)
        with BuildLine():
            Line((40, 28), (40, 55))
            Line((40, 55), (40, 100.870302184))
            Line((40, 100.870302184), (40, 102))
            Line((40, 102), (42.775, 102))
            Line((42.775, 102), (47.775, 102))
            ThreePointArc((47.775, 102), (47.790191541, 102.301526886), (47.835612309, 102.6))
            Line((47.835612309, 102.6), (40, 102.6))
            Line((40, 102.6), (39.4, 102.6))
            Line((39.4, 102.6), (39.4, 102))
            Line((39.4, 102), (39.4, 100.870302184))
            Line((39.4, 100.870302184), (39.4, 55))
            Line((39.4, 55), (39.4, 27.4))
            Line((39.4, 27.4), (42.775, 27.4))
            Line((42.775, 27.4), (47.835612309, 27.4))
            ThreePointArc((47.835612309, 27.4), (47.790191541, 27.698473114), (47.775, 28))
            Line((47.775, 28), (42.775, 28))
            Line((42.775, 28), (40, 28))
        make_face()
        with BuildLine():
            ThreePointArc((47.835612309, 102.6), (47.790191541, 102.301526886), (47.775, 102))
            Line((47.775, 102), (56.225, 102))
            ThreePointArc((56.225, 102), (56.209808459, 102.301526886), (56.164387691, 102.6))
            Line((56.164387691, 102.6), (47.835612309, 102.6))
        make_face()
    extrude(amount=CUT_EXTRUDE4_DEPTH + CUT_EXTRUDE4_DEPTH_BACK, mode=Mode.SUBTRACT)

    # Sketch14 → Boss-Extrude6 (add)
    with BuildSketch(Plane(origin=(-36.85, 0, 0), x_dir=(0, 0, -1), z_dir=(1, 0, 0)).offset(BOSS_EXTRUDE6_START)):
        with BuildLine():
            Line((-14.166666667, 38.797294107), (-5.014577132, 25))
            Line((-5.014577132, 25), (0, 25))
            Line((0, 25), (0, 105))
            Line((0, 105), (-5.014577132, 105))
            Line((-5.014577132, 105), (-14.166666667, 91.202705893))
            ThreePointArc((-14.166666667, 91.202705893), (-19.814280101, 85.162622612), (-27.123287671, 81.295252462))
            ThreePointArc((-27.123287671, 81.295252462), (-29.199746644, 79.775277843), (-29.999950613, 77.329530859))
            ThreePointArc((-29.999950613, 77.329530859), (-29.548963562, 75.45641728), (-28.309090909, 73.981744571))
            ThreePointArc((-28.309090909, 73.981744571), (-23.8, 65), (-28.309090909, 56.018255429))
            ThreePointArc((-28.309090909, 56.018255429), (-29.548963562, 54.54358272), (-29.999950613, 52.670469141))
            ThreePointArc((-29.999950613, 52.670469141), (-29.199746644, 50.224722157), (-27.123287671, 48.704747538))
            ThreePointArc((-27.123287671, 48.704747538), (-19.814280101, 44.837377388), (-14.166666667, 38.797294107))
        make_face()
    extrude(amount=-BOSS_EXTRUDE6_DEPTH)

    # Sketch15 → Boss-Extrude7 (add)
    with BuildSketch(Plane.ZY.offset(67.15)):
        with BuildLine():
            Line((0, 105), (0, 25))
            Line((0, 25), (5.014577132, 25))
            Line((5.014577132, 25), (14.166666667, 38.797294107))
            ThreePointArc((14.166666667, 38.797294107), (19.814280101, 44.837377388), (27.123287671, 48.704747538))
            ThreePointArc((27.123287671, 48.704747538), (29.199746644, 50.224722157), (29.999950613, 52.670469141))
            ThreePointArc((29.999950613, 52.670469141), (29.548963562, 54.54358272), (28.309090909, 56.018255429))
            ThreePointArc((28.309090909, 56.018255429), (23.8, 65), (28.309090909, 73.981744571))
            ThreePointArc((28.309090909, 73.981744571), (29.548963562, 75.45641728), (29.999950613, 77.329530859))
            ThreePointArc((29.999950613, 77.329530859), (29.199746644, 79.775277843), (27.123287671, 81.295252462))
            ThreePointArc((27.123287671, 81.295252462), (19.814280101, 85.162622612), (14.166666667, 91.202705893))
            Line((14.166666667, 91.202705893), (5.014577132, 105))
            Line((5.014577132, 105), (0, 105))
        make_face()
    extrude(amount=BOSS_EXTRUDE7_DEPTH)

    # Sketch17 → Boss-Extrude8 (add)
    with BuildSketch(Plane.ZY.offset(70.15)):
        with BuildLine():
            Line((5.014577132, 105), (0, 105))
            Line((0, 105), (0, 25))
            Line((0, 25), (5.014577132, 25))
            Line((5.014577132, 25), (14.166666667, 38.797294107))
            ThreePointArc((14.166666667, 38.797294107), (19.814280101, 44.837377388), (27.123287671, 48.704747538))
            ThreePointArc((27.123287671, 48.704747538), (29.199746644, 50.224722157), (29.999950613, 52.670469141))
            ThreePointArc((29.999950613, 52.670469141), (29.548963562, 54.54358272), (28.309090909, 56.018255429))
            ThreePointArc((28.309090909, 56.018255429), (23.8, 65), (28.309090909, 73.981744571))
            ThreePointArc((28.309090909, 73.981744571), (29.548963562, 75.45641728), (29.999950613, 77.329530859))
            ThreePointArc((29.999950613, 77.329530859), (29.199746644, 79.775277843), (27.123287671, 81.295252462))
            ThreePointArc((27.123287671, 81.295252462), (19.814280101, 85.162622612), (14.166666667, 91.202705893))
            Line((14.166666667, 91.202705893), (5.014577132, 105))
        make_face()
    extrude(amount=BOSS_EXTRUDE8_DEPTH)

    # Sketch18 → Boss-Extrude9 (add)
    with BuildSketch(Plane(origin=(-33.85, 0, 0), x_dir=(0, 0, -1), z_dir=(1, 0, 0)).offset(BOSS_EXTRUDE9_START)):
        with BuildLine():
            Line((-14.166666667, 38.797294107), (-5.014577132, 25))
            Line((-5.014577132, 25), (0, 25))
            Line((0, 25), (0, 105))
            Line((0, 105), (-5.014577132, 105))
            Line((-5.014577132, 105), (-14.166666667, 91.202705893))
            ThreePointArc((-14.166666667, 91.202705893), (-19.814280101, 85.162622612), (-27.123287671, 81.295252462))
            ThreePointArc((-27.123287671, 81.295252462), (-29.199746644, 79.775277843), (-29.999950613, 77.329530859))
            ThreePointArc((-29.999950613, 77.329530859), (-29.548963562, 75.45641728), (-28.309090909, 73.981744571))
            ThreePointArc((-28.309090909, 73.981744571), (-23.8, 65), (-28.309090909, 56.018255429))
            ThreePointArc((-28.309090909, 56.018255429), (-29.548963562, 54.54358272), (-29.999950613, 52.670469141))
            ThreePointArc((-29.999950613, 52.670469141), (-29.199746644, 50.224722157), (-27.123287671, 48.704747538))
            ThreePointArc((-27.123287671, 48.704747538), (-19.814280101, 44.837377388), (-14.166666667, 38.797294107))
        make_face()
    extrude(amount=-BOSS_EXTRUDE9_DEPTH)

    # Sketch20 → Boss-Extrude10 (add)
    with BuildSketch(Plane.XY.offset(5)):
        Polygon((-64.15, 108), (-39.85, 108), (-31.85, 108), (-31.85, 105), (-72.15, 105), (-72.15, 108), align=None)
        with BuildLine():
            Line((-31.85, 25), (-31.85, 22))
            Line((-31.85, 22), (-39.85, 22))
            ThreePointArc((-39.85, 22), (-37.736463575, 22.870924196), (-36.850080491, 24.978024147))
            Line((-36.850080491, 24.978024147), (-67.149919509, 24.978024147))
            ThreePointArc((-67.149919509, 24.978024147), (-66.263536425, 22.870924196), (-64.15, 22))
            Line((-64.15, 22), (-72.15, 22))
            Line((-72.15, 22), (-72.15, 25))
            Line((-72.15, 25), (-31.85, 25))
        make_face()
        with BuildLine():
            ThreePointArc((-67.149919509, 24.978024147), (-66.263536425, 22.870924196), (-64.15, 22))
            Line((-64.15, 22), (-62.15, 22))
            Line((-62.15, 22), (-41.85, 22))
            Line((-41.85, 22), (-39.85, 22))
            ThreePointArc((-39.85, 22), (-37.736463575, 22.870924196), (-36.850080491, 24.978024147))
            Line((-36.850080491, 24.978024147), (-67.149919509, 24.978024147))
        make_face()
    extrude(amount=-BOSS_EXTRUDE10_DEPTH)

    # Fillet8
    fillet8_edges = [part.edges().sort_by_distance(p)[0] for p in [
        (-31.85, 108, 2.5),
        (-72.15, 108, 2.5),
        (-31.85, 22, 2.5),
        (-72.15, 22, 2.5),
    ]]
    fillet(fillet8_edges, radius=FILLET8_R)

    # Sketch21 → Cut-Extrude5 (cut, two sides: drawn at the far end of the back side and taken through both)
    with BuildSketch(Plane(origin=(-31.85, 0, 0), x_dir=(0, 0, -1), z_dir=(1, 0, 0)).offset(-CUT_EXTRUDE5_DEPTH_BACK)):
        with Locations((-8.8, 55)):
            Circle(SKETCH21_R)
        with Locations((-8.8, 75)):
            Circle(SKETCH21_R)
    extrude(amount=CUT_EXTRUDE5_DEPTH + CUT_EXTRUDE5_DEPTH_BACK, mode=Mode.SUBTRACT)

    # Sketch24 → Boss-Extrude11 (add)
    with BuildSketch(Plane(origin=(-31.85, 0, 0), x_dir=(0, 0, -1), z_dir=(1, 0, 0))):
        Polygon((-7.004552006, 102), (0, 102), (0, 105), (-5, 105), (-5.014577132, 105), align=None)
        Polygon((-5, 25), (0, 25), (0, 28), (-7.004552006, 28), (-5.014577132, 25), align=None)
    extrude(amount=-BOSS_EXTRUDE11_DEPTH)

    # Sketch28 → Cut-Extrude6 (cut, two sides: drawn at the far end of the back side and taken through both)
    with BuildSketch(Plane.ZY.offset(72.15).offset(-CUT_EXTRUDE6_DEPTH_BACK)):
        with BuildLine():
            Line((27.3, 81.232171981), (27.3, 73.133265027))
            ThreePointArc((27.3, 73.133265027), (27.792049841, 73.572365747), (28.309090909, 73.981744571))
            ThreePointArc((28.309090909, 73.981744571), (29.548963562, 75.45641728), (29.999950613, 77.329530859))
            ThreePointArc((29.999950613, 77.329530859), (29.253984826, 79.698721222), (27.3, 81.232171981))
        make_face()
        with BuildLine():
            ThreePointArc((28.309090909, 56.018255429), (27.792049841, 56.427634253), (27.3, 56.866734973))
            Line((27.3, 56.866734973), (27.3, 48.767828019))
            ThreePointArc((27.3, 48.767828019), (29.253984826, 50.301278778), (29.999950613, 52.670469141))
            ThreePointArc((29.999950613, 52.670469141), (29.548963562, 54.54358272), (28.309090909, 56.018255429))
        make_face()
    extrude(amount=CUT_EXTRUDE6_DEPTH + CUT_EXTRUDE6_DEPTH_BACK, mode=Mode.SUBTRACT)

    # Sketch30 → Cut-Extrude7 (cut, two sides: drawn at the far end of the back side and taken through both)
    with BuildSketch(Plane.ZY.offset(72.15).offset(-CUT_EXTRUDE7_DEPTH_BACK)):
        with BuildLine():
            Line((19.125884799, 85.708445192), (27.3, 78.133265027))
            Line((27.3, 78.133265027), (27.3, 81.232171981))
            ThreePointArc((27.3, 81.232171981), (27.211996142, 81.264699166), (27.123287671, 81.295252462))
            ThreePointArc((27.123287671, 81.295252462), (22.921319625, 83.133497596), (19.125884799, 85.708445192))
        make_face()
        with BuildLine():
            Line((27.3, 48.767828019), (27.3, 51.866734973))
            Line((27.3, 51.866734973), (19.125884799, 44.291554808))
            ThreePointArc((19.125884799, 44.291554808), (22.921319625, 46.866502404), (27.123287671, 48.704747538))
            ThreePointArc((27.123287671, 48.704747538), (27.211996142, 48.735300834), (27.3, 48.767828019))
        make_face()
    extrude(amount=CUT_EXTRUDE7_DEPTH + CUT_EXTRUDE7_DEPTH_BACK, mode=Mode.SUBTRACT)

    # Fillet9
    fillet9_edges = [part.edges().sort_by_distance(p)[0] for p in [
        (-35.625, 73.133265027, 27.3),
        (-68.375, 73.133265027, 27.3),
        (-35.625, 56.866734973, 27.3),
        (-68.375, 56.866734973, 27.3),
        (-68.375, 78.133265027, 27.3),
        (-68.375, 51.866734973, 27.3),
        (-35.625, 78.133265027, 27.3),
        (-35.625, 51.866734973, 27.3),
    ]]
    fillet(fillet9_edges, radius=FILLET9_R)


solid = part.part
